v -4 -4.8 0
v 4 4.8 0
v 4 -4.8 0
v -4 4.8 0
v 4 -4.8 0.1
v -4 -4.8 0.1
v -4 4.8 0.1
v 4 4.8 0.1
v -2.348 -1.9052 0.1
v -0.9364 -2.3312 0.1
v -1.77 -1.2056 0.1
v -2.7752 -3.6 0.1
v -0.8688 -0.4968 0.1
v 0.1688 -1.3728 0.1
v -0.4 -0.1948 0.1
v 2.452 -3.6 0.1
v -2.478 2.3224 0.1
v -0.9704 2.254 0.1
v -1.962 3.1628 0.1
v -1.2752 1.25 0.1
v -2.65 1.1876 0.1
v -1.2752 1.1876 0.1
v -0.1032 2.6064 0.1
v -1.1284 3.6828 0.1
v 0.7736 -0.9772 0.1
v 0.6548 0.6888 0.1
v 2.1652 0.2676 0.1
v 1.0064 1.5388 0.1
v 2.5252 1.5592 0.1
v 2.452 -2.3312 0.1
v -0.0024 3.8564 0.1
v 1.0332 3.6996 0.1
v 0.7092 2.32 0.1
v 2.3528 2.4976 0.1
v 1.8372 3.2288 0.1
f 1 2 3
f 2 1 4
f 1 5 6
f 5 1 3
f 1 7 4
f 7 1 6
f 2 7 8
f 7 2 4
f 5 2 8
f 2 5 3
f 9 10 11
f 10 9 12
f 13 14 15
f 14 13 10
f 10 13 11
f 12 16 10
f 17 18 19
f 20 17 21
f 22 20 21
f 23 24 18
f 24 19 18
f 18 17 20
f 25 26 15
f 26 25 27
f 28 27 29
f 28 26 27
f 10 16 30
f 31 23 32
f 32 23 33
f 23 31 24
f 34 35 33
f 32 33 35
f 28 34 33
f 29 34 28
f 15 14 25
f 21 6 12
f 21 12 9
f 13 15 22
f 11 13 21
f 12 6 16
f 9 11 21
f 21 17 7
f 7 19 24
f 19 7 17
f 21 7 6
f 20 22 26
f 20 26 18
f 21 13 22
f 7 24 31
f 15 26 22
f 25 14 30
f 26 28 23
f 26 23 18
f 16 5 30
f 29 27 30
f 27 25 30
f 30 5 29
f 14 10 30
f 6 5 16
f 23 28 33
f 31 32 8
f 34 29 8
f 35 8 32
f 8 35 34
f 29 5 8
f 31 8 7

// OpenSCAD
// file: ../p/4-4edge.scad
use <../lib.scad>
$fa=1; $fs=0.2;
function ldraw_lib__4_4edge(realsolid=false) = [
// 0 Circle 1.0
// 0 Name: 4-4edge.dat
// 0 Author: James Jessiman
// 0 !LDRAW_ORG Primitive UPDATE 2017-01
// 0 !LICENSE Licensed under CC BY 2.0 and CC BY 4.0 : see CAreadme.txt
// 
// 0 BFC CERTIFY CCW
  [0,"BFC","CERTIFY"],
  [0,"BFC","CCW"],
// 
// 0 !HISTORY 1998-12-15 [PTadmin] Official Update 1998-10
// 0 !HISTORY 2005-12-28 [PTadmin] Official Update 2005-01
// 0 !HISTORY 2007-06-24 [PTadmin] Header formatted for Contributor Agreement
// 0 !HISTORY 2008-07-01 [PTadmin] Official Update 2008-01
// 0 !HISTORY 2017-01-15 [Steffen] BFCed
// 0 !HISTORY 2017-12-30 [PTadmin] Official Update 2017-01
// 
// 
// 2 24 1 0 0 0.9239 0 0.3827
  [2,24,1,0,0,0.9239,0,0.3827],
// 2 24 0.9239 0 0.3827 0.7071 0 0.7071
  [2,24,0.9239,0,0.3827,0.7071,0,0.7071],
// 2 24 0.7071 0 0.7071 0.3827 0 0.9239
  [2,24,0.7071,0,0.7071,0.3827,0,0.9239],
// 2 24 0.3827 0 0.9239 0 0 1
  [2,24,0.3827,0,0.9239,0,0,1],
// 2 24 0 0 1 -0.3827 0 0.9239
  [2,24,0,0,1,-0.3827,0,0.9239],
// 2 24 -0.3827 0 0.9239 -0.7071 0 0.7071
  [2,24,-0.3827,0,0.9239,-0.7071,0,0.7071],
// 2 24 -0.7071 0 0.7071 -0.9239 0 0.3827
  [2,24,-0.7071,0,0.7071,-0.9239,0,0.3827],
// 2 24 -0.9239 0 0.3827 -1 0 -0
  [2,24,-0.9239,0,0.3827,-1,0,-0],
// 2 24 -1 0 -0 -0.9239 0 -0.3827
  [2,24,-1,0,-0,-0.9239,0,-0.3827],
// 2 24 -0.9239 0 -0.3827 -0.7071 0 -0.7071
  [2,24,-0.9239,0,-0.3827,-0.7071,0,-0.7071],
// 2 24 -0.7071 0 -0.7071 -0.3827 0 -0.9239
  [2,24,-0.7071,0,-0.7071,-0.3827,0,-0.9239],
// 2 24 -0.3827 0 -0.9239 0 0 -1
  [2,24,-0.3827,0,-0.9239,0,0,-1],
// 2 24 0 0 -1 0.3827 0 -0.9239
  [2,24,0,0,-1,0.3827,0,-0.9239],
// 2 24 0.3827 0 -0.9239 0.7071 0 -0.7071
  [2,24,0.3827,0,-0.9239,0.7071,0,-0.7071],
// 2 24 0.7071 0 -0.7071 0.9239 0 -0.3827
  [2,24,0.7071,0,-0.7071,0.9239,0,-0.3827],
// 2 24 0.9239 0 -0.3827 1 0 0
  [2,24,0.9239,0,-0.3827,1,0,0],
];
module ldraw_lib__4_4edge(step=0, col=false, unit=2/5, alt=false, line=0.2, solid=!$preview)
    makepoly(ldraw_lib__4_4edge(solid), step=step, col=col, unit=unit, alt=alt, line=line, solid=solid);
ldraw_lib__4_4edge(line=0.2);
// file: ../p/4-4disc.scad
use <../lib.scad>
$fa=1; $fs=0.2;
function ldraw_lib__4_4disc(realsolid=false) = [
// 0 Disc 1.0
// 0 Name: 4-4disc.dat
// 0 Author: James Jessiman
// 0 !LDRAW_ORG Primitive UPDATE 2002-02
// 0 !LICENSE Licensed under CC BY 2.0 and CC BY 4.0 : see CAreadme.txt
// 
// 0 BFC CERTIFY CCW
  [0,"BFC","CERTIFY"],
  [0,"BFC","CCW"],
// 
// 0 !HISTORY 1998-12-15 [PTadmin] Official Update 1998-10
// 0 !HISTORY 2002-03-23 [sbliss] Added BFC statement
// 0 !HISTORY 2002-04-25 [PTadmin] Official Update 2002-02
// 0 !HISTORY 2007-06-24 [PTadmin] Header formatted for Contributor Agreement
// 0 !HISTORY 2008-07-01 [PTadmin] Official Update 2008-01
// 
// 
// 3 16 0 0 0 1 0 0 0.9239 0 0.3827
  [3,16,0,0,0,1,0,0,0.9239,0,0.3827],
// 3 16 0 0 0 0.9239 0 0.3827 0.7071 0 0.7071
  [3,16,0,0,0,0.9239,0,0.3827,0.7071,0,0.7071],
// 3 16 0 0 0 0.7071 0 0.7071 0.3827 0 0.9239
  [3,16,0,0,0,0.7071,0,0.7071,0.3827,0,0.9239],
// 3 16 0 0 0 0.3827 0 0.9239 0 0 1
  [3,16,0,0,0,0.3827,0,0.9239,0,0,1],
// 3 16 0 0 0 0 0 1 -0.3827 0 0.9239
  [3,16,0,0,0,0,0,1,-0.3827,0,0.9239],
// 3 16 0 0 0 -0.3827 0 0.9239 -0.7071 0 0.7071
  [3,16,0,0,0,-0.3827,0,0.9239,-0.7071,0,0.7071],
// 3 16 0 0 0 -0.7071 0 0.7071 -0.9239 0 0.3827
  [3,16,0,0,0,-0.7071,0,0.7071,-0.9239,0,0.3827],
// 3 16 0 0 0 -0.9239 0 0.3827 -1 0 -0
  [3,16,0,0,0,-0.9239,0,0.3827,-1,0,-0],
// 3 16 0 0 0 -1 0 -0 -0.9239 0 -0.3827
  [3,16,0,0,0,-1,0,-0,-0.9239,0,-0.3827],
// 3 16 0 0 0 -0.9239 0 -0.3827 -0.7071 0 -0.7071
  [3,16,0,0,0,-0.9239,0,-0.3827,-0.7071,0,-0.7071],
// 3 16 0 0 0 -0.7071 0 -0.7071 -0.3827 0 -0.9239
  [3,16,0,0,0,-0.7071,0,-0.7071,-0.3827,0,-0.9239],
// 3 16 0 0 0 -0.3827 0 -0.9239 0 0 -1
  [3,16,0,0,0,-0.3827,0,-0.9239,0,0,-1],
// 3 16 0 0 0 0 0 -1 0.3827 0 -0.9239
  [3,16,0,0,0,0,0,-1,0.3827,0,-0.9239],
// 3 16 0 0 0 0.3827 0 -0.9239 0.7071 0 -0.7071
  [3,16,0,0,0,0.3827,0,-0.9239,0.7071,0,-0.7071],
// 3 16 0 0 0 0.7071 0 -0.7071 0.9239 0 -0.3827
  [3,16,0,0,0,0.7071,0,-0.7071,0.9239,0,-0.3827],
// 3 16 0 0 0 0.9239 0 -0.3827 1 0 0
  [3,16,0,0,0,0.9239,0,-0.3827,1,0,0],
// 0
];
module ldraw_lib__4_4disc(step=0, col=false, unit=2/5, alt=false, line=0.2, solid=!$preview)
    makepoly(ldraw_lib__4_4disc(solid), step=step, col=col, unit=unit, alt=alt, line=line, solid=solid);
ldraw_lib__4_4disc(line=0.2);
// file: ../p/4-4cyli.scad
use <../lib.scad>
$fa=1; $fs=0.2;
function ldraw_lib__4_4cyli(realsolid=false) = [
// 0 Cylinder 1.0
// 0 Name: 4-4cyli.dat
// 0 Author: James Jessiman
// 0 !LDRAW_ORG Primitive UPDATE 2005-01
// 0 !LICENSE Licensed under CC BY 2.0 and CC BY 4.0 : see CAreadme.txt
// 
// 0 BFC CERTIFY CCW
  [0,"BFC","CERTIFY"],
  [0,"BFC","CCW"],
// 
// 0 !HISTORY 1998-12-15 [PTadmin] Official Update 1998-10
// 0 !HISTORY 2002-03-23 [sbliss] Added BFC statement; merged headers from files in distributions LDraw 0.27 and Complete.
// 0 !HISTORY 2002-04-25 [PTadmin] Official Update 2002-02
// 0 !HISTORY 2004-12-14 [guyvivan] BFC CCW
// 0 !HISTORY 2005-12-28 [PTadmin] Official Update 2005-01
// 0 !HISTORY 2007-06-24 [PTadmin] Header formatted for Contributor Agreement
// 0 !HISTORY 2008-07-01 [PTadmin] Official Update 2008-01
// 
// 
// 4 16 1 1 0 0.9239 1 0.3827 0.9239 0 0.3827 1 0 0
  [4,16,1,1,0,0.9239,1,0.3827,0.9239,0,0.3827,1,0,0],
// 5 24 1 0 0 1 1 0 0.9239 0 0.3827 0.9239 0 -0.3827
  [5,24,1,0,0,1,1,0,0.9239,0,0.3827,0.9239,0,-0.3827],
// 4 16 0.9239 1 0.3827 0.7071 1 0.7071 0.7071 0 0.7071 0.9239 0 0.3827
  [4,16,0.9239,1,0.3827,0.7071,1,0.7071,0.7071,0,0.7071,0.9239,0,0.3827],
// 5 24 0.9239 0 0.3827 0.9239 1 0.3827 0.7071 0 0.7071 1 0 0
  [5,24,0.9239,0,0.3827,0.9239,1,0.3827,0.7071,0,0.7071,1,0,0],
// 4 16 0.7071 1 0.7071 0.3827 1 0.9239 0.3827 0 0.9239 0.7071 0 0.7071
  [4,16,0.7071,1,0.7071,0.3827,1,0.9239,0.3827,0,0.9239,0.7071,0,0.7071],
// 5 24 0.7071 0 0.7071 0.7071 1 0.7071 0.3827 0 0.9239 0.9239 0 0.3827
  [5,24,0.7071,0,0.7071,0.7071,1,0.7071,0.3827,0,0.9239,0.9239,0,0.3827],
// 4 16 0.3827 1 0.9239 0 1 1 0 0 1 0.3827 0 0.9239
  [4,16,0.3827,1,0.9239,0,1,1,0,0,1,0.3827,0,0.9239],
// 5 24 0.3827 0 0.9239 0.3827 1 0.9239 0 0 1 0.7071 0 0.7071
  [5,24,0.3827,0,0.9239,0.3827,1,0.9239,0,0,1,0.7071,0,0.7071],
// 4 16 0 1 1 -0.3827 1 0.9239 -0.3827 0 0.9239 0 0 1
  [4,16,0,1,1,-0.3827,1,0.9239,-0.3827,0,0.9239,0,0,1],
// 5 24 0 0 1 0 1 1 -0.3827 0 0.9239 0.3827 0 0.9239
  [5,24,0,0,1,0,1,1,-0.3827,0,0.9239,0.3827,0,0.9239],
// 4 16 -0.3827 1 0.9239 -0.7071 1 0.7071 -0.7071 0 0.7071 -0.3827 0 0.9239
  [4,16,-0.3827,1,0.9239,-0.7071,1,0.7071,-0.7071,0,0.7071,-0.3827,0,0.9239],
// 5 24 -0.3827 0 0.9239 -0.3827 1 0.9239 -0.7071 0 0.7071 0 0 1
  [5,24,-0.3827,0,0.9239,-0.3827,1,0.9239,-0.7071,0,0.7071,0,0,1],
// 4 16 -0.7071 1 0.7071 -0.9239 1 0.3827 -0.9239 0 0.3827 -0.7071 0 0.7071
  [4,16,-0.7071,1,0.7071,-0.9239,1,0.3827,-0.9239,0,0.3827,-0.7071,0,0.7071],
// 5 24 -0.7071 0 0.7071 -0.7071 1 0.7071 -0.9239 0 0.3827 -0.3827 0 0.9239
  [5,24,-0.7071,0,0.7071,-0.7071,1,0.7071,-0.9239,0,0.3827,-0.3827,0,0.9239],
// 4 16 -0.9239 1 0.3827 -1 1 0 -1 0 0 -0.9239 0 0.3827
  [4,16,-0.9239,1,0.3827,-1,1,0,-1,0,0,-0.9239,0,0.3827],
// 5 24 -0.9239 0 0.3827 -0.9239 1 0.3827 -1 0 0 -0.7071 0 0.7071
  [5,24,-0.9239,0,0.3827,-0.9239,1,0.3827,-1,0,0,-0.7071,0,0.7071],
// 4 16 -1 1 0 -0.9239 1 -0.3827 -0.9239 0 -0.3827 -1 0 0
  [4,16,-1,1,0,-0.9239,1,-0.3827,-0.9239,0,-0.3827,-1,0,0],
// 5 24 -1 0 0 -1 1 0 -0.9239 0 -0.3827 -0.9239 0 0.3827
  [5,24,-1,0,0,-1,1,0,-0.9239,0,-0.3827,-0.9239,0,0.3827],
// 4 16 -0.9239 1 -0.3827 -0.7071 1 -0.7071 -0.7071 0 -0.7071 -0.9239 0 -0.3827
  [4,16,-0.9239,1,-0.3827,-0.7071,1,-0.7071,-0.7071,0,-0.7071,-0.9239,0,-0.3827],
// 5 24 -0.9239 0 -0.3827 -0.9239 1 -0.3827 -0.7071 0 -0.7071 -1 0 0
  [5,24,-0.9239,0,-0.3827,-0.9239,1,-0.3827,-0.7071,0,-0.7071,-1,0,0],
// 4 16 -0.7071 1 -0.7071 -0.3827 1 -0.9239 -0.3827 0 -0.9239 -0.7071 0 -0.7071
  [4,16,-0.7071,1,-0.7071,-0.3827,1,-0.9239,-0.3827,0,-0.9239,-0.7071,0,-0.7071],
// 5 24 -0.7071 0 -0.7071 -0.7071 1 -0.7071 -0.3827 0 -0.9239 -0.9239 0 -0.3827
  [5,24,-0.7071,0,-0.7071,-0.7071,1,-0.7071,-0.3827,0,-0.9239,-0.9239,0,-0.3827],
// 4 16 -0.3827 1 -0.9239 0 1 -1 0 0 -1 -0.3827 0 -0.9239
  [4,16,-0.3827,1,-0.9239,0,1,-1,0,0,-1,-0.3827,0,-0.9239],
// 5 24 -0.3827 0 -0.9239 -0.3827 1 -0.9239 0 0 -1 -0.7071 0 -0.7071
  [5,24,-0.3827,0,-0.9239,-0.3827,1,-0.9239,0,0,-1,-0.7071,0,-0.7071],
// 4 16 0 1 -1 0.3827 1 -0.9239 0.3827 0 -0.9239 0 0 -1
  [4,16,0,1,-1,0.3827,1,-0.9239,0.3827,0,-0.9239,0,0,-1],
// 5 24 0 0 -1 0 1 -1 0.3827 0 -0.9239 -0.3827 0 -0.9239
  [5,24,0,0,-1,0,1,-1,0.3827,0,-0.9239,-0.3827,0,-0.9239],
// 4 16 0.3827 1 -0.9239 0.7071 1 -0.7071 0.7071 0 -0.7071 0.3827 0 -0.9239
  [4,16,0.3827,1,-0.9239,0.7071,1,-0.7071,0.7071,0,-0.7071,0.3827,0,-0.9239],
// 5 24 0.3827 0 -0.9239 0.3827 1 -0.9239 0.7071 0 -0.7071 0 0 -1
  [5,24,0.3827,0,-0.9239,0.3827,1,-0.9239,0.7071,0,-0.7071,0,0,-1],
// 4 16 0.7071 1 -0.7071 0.9239 1 -0.3827 0.9239 0 -0.3827 0.7071 0 -0.7071
  [4,16,0.7071,1,-0.7071,0.9239,1,-0.3827,0.9239,0,-0.3827,0.7071,0,-0.7071],
// 5 24 0.7071 0 -0.7071 0.7071 1 -0.7071 0.9239 0 -0.3827 0.3827 0 -0.9239
  [5,24,0.7071,0,-0.7071,0.7071,1,-0.7071,0.9239,0,-0.3827,0.3827,0,-0.9239],
// 4 16 0.9239 1 -0.3827 1 1 0 1 0 0 0.9239 0 -0.3827
  [4,16,0.9239,1,-0.3827,1,1,0,1,0,0,0.9239,0,-0.3827],
// 5 24 0.9239 0 -0.3827 0.9239 1 -0.3827 1 0 0 0.7071 0 -0.7071
  [5,24,0.9239,0,-0.3827,0.9239,1,-0.3827,1,0,0,0.7071,0,-0.7071],
// 0
];
module ldraw_lib__4_4cyli(step=0, col=false, unit=2/5, alt=false, line=0.2, solid=!$preview)
    makepoly(ldraw_lib__4_4cyli(solid), step=step, col=col, unit=unit, alt=alt, line=line, solid=solid);
ldraw_lib__4_4cyli(line=0.2);
// file: ../p/stud3.scad
use <../lib.scad>
use <4-4cyli.scad>
use <4-4disc.scad>
use <4-4edge.scad>
$fa=1; $fs=0.2;
function ldraw_lib__stud3(realsolid=false) = realsolid ? 
    [openscad(translate([0,0,-eps()], o=cylinder(4+eps(), r=4)),2)] : [
// 0 Stud Tube Solid
// 0 Name: stud3.dat
// 0 Author: James Jessiman
// 0 !LDRAW_ORG Primitive UPDATE 2012-01
// 0 !LICENSE Licensed under CC BY 2.0 and CC BY 4.0 : see CAreadme.txt
// 
// 0 BFC CERTIFY CCW
  [0,"BFC","CERTIFY"],
  [0,"BFC","CCW"],
// 
// 0 !HISTORY 2002-04-04 [sbliss] Modified for BFC compliance
// 0 !HISTORY 2002-04-25 [PTadmin] Official Update 2002-02
// 0 !HISTORY 2007-06-24 [PTadmin] Header formatted for Contributor Agreement
// 0 !HISTORY 2008-07-01 [PTadmin] Official Update 2008-01
// 0 !HISTORY 2012-02-16 [Philo] Changed to CCW
// 0 !HISTORY 2012-03-30 [PTadmin] Official Update 2012-01
// 
// 
// 1 16 0 -4 0 4 0 0 0 1 0 0 0 4 4-4edge.dat
  [1,16,0,-4,0,4,0,0,0,1,0,0,0,4, ldraw_lib__4_4edge(realsolid)],
// 1 16 0 0 0 4 0 0 0 1 0 0 0 4 4-4edge.dat
  [1,16,0,0,0,4,0,0,0,1,0,0,0,4, ldraw_lib__4_4edge(realsolid)],
// 1 16 0 -4 0 4 0 0 0 1 0 0 0 4 4-4disc.dat
  [1,16,0,-4,0,4,0,0,0,1,0,0,0,4, ldraw_lib__4_4disc(realsolid)],
// 1 16 0 -4 0 4 0 0 0 4 0 0 0 4 4-4cyli.dat
  [1,16,0,-4,0,4,0,0,0,4,0,0,0,4, ldraw_lib__4_4cyli(realsolid)],
];
module ldraw_lib__stud3(step=0, col=false, unit=2/5, alt=false, line=0.2, solid=!$preview)
    makepoly(ldraw_lib__stud3(solid), step=step, col=col, unit=unit, alt=alt, line=line, solid=solid);
ldraw_lib__stud3(line=0.2);
// file: ../p/stud.scad
use <../lib.scad>
use <4-4cyli.scad>
use <4-4disc.scad>
use <4-4edge.scad>
$fa=1; $fs=0.2;
function ldraw_lib__stud(realsolid=false) = realsolid ? 
    [openscad(translate([0,0,-eps()], o=cylinder(4+eps(), r=6)),2)] : [
// 0 Stud
// 0 Name: stud.dat
// 0 Author: James Jessiman
// 0 !LDRAW_ORG Primitive UPDATE 2012-01
// 0 !LICENSE Licensed under CC BY 2.0 and CC BY 4.0 : see CAreadme.txt
// 
// 0 BFC CERTIFY CCW
  [0,"BFC","CERTIFY"],
  [0,"BFC","CCW"],
// 
// 0 !HISTORY 2002-04-04 [sbliss] Modified for BFC compliance
// 0 !HISTORY 2002-04-25 [PTadmin] Official Update 2002-02
// 0 !HISTORY 2007-06-24 [PTadmin] Header formatted for Contributor Agreement
// 0 !HISTORY 2008-07-01 [PTadmin] Official Update 2008-01
// 0 !HISTORY 2012-02-16 [Philo] Changed to CCW
// 0 !HISTORY 2012-03-30 [PTadmin] Official Update 2012-01
// 
// 
// 1 16 0 0 0 6 0 0 0 1 0 0 0 6 4-4edge.dat
  [1,16,0,0,0,6,0,0,0,1,0,0,0,6, ldraw_lib__4_4edge(realsolid)],
// 1 16 0 -4 0 6 0 0 0 1 0 0 0 6 4-4edge.dat
  [1,16,0,-4,0,6,0,0,0,1,0,0,0,6, ldraw_lib__4_4edge(realsolid)],
// 1 16 0 0 0 6 0 0 0 -4 0 0 0 6 4-4cyli.dat
  [1,16,0,0,0,6,0,0,0,-4,0,0,0,6, ldraw_lib__4_4cyli(realsolid)],
// 1 16 0 -4 0 6 0 0 0 1 0 0 0 6 4-4disc.dat
  [1,16,0,-4,0,6,0,0,0,1,0,0,0,6, ldraw_lib__4_4disc(realsolid)],
];
module ldraw_lib__stud(step=0, col=false, unit=2/5, alt=false, line=0.2, solid=!$preview)
    makepoly(ldraw_lib__stud(solid), step=step, col=col, unit=unit, alt=alt, line=line, solid=solid);
ldraw_lib__stud(line=0.2);
// file: ../p/box5.scad
use <../lib.scad>
$fa=1; $fs=0.2;
function ldraw_lib__box5(realsolid=false) = [
// 0 Box with 5 Faces and All Edges
// 0 Name: box5.dat
// 0 Author: James Jessiman
// 0 !LDRAW_ORG Primitive UPDATE 2012-01
// 0 !LICENSE Licensed under CC BY 2.0 and CC BY 4.0 : see CAreadme.txt
// 
// 0 BFC CERTIFY CCW
  [0,"BFC","CERTIFY"],
  [0,"BFC","CCW"],
// 
// 0 !HISTORY 2002-04-03 [sbliss] Modified for BFC compliance
// 0 !HISTORY 2002-04-25 [PTadmin] Official Update 2002-02
// 0 !HISTORY 2007-06-24 [PTadmin] Header formatted for Contributor Agreement
// 0 !HISTORY 2008-07-01 [PTadmin] Official Update 2008-01
// 0 !HISTORY 2012-02-16 [Philo] Changed to CCW
// 0 !HISTORY 2012-03-30 [PTadmin] Official Update 2012-01
// 
// 
// 2 24 1 1 1 -1 1 1
  [2,24,1,1,1,-1,1,1],
// 2 24 -1 1 1 -1 1 -1
  [2,24,-1,1,1,-1,1,-1],
// 2 24 -1 1 -1 1 1 -1
  [2,24,-1,1,-1,1,1,-1],
// 2 24 1 1 -1 1 1 1
  [2,24,1,1,-1,1,1,1],
// 2 24 1 0 1 -1 0 1
  [2,24,1,0,1,-1,0,1],
// 2 24 -1 0 1 -1 0 -1
  [2,24,-1,0,1,-1,0,-1],
// 2 24 -1 0 -1 1 0 -1
  [2,24,-1,0,-1,1,0,-1],
// 2 24 1 0 -1 1 0 1
  [2,24,1,0,-1,1,0,1],
// 2 24 1 0 1 1 1 1
  [2,24,1,0,1,1,1,1],
// 2 24 -1 0 1 -1 1 1
  [2,24,-1,0,1,-1,1,1],
// 2 24 1 0 -1 1 1 -1
  [2,24,1,0,-1,1,1,-1],
// 2 24 -1 0 -1 -1 1 -1
  [2,24,-1,0,-1,-1,1,-1],
// 4 16 -1 1 1 1 1 1 1 1 -1 -1 1 -1
  [4,16,-1,1,1,1,1,1,1,1,-1,-1,1,-1],
// 4 16 -1 1 1 -1 0 1 1 0 1 1 1 1
  [4,16,-1,1,1,-1,0,1,1,0,1,1,1,1],
// 4 16 -1 1 -1 -1 0 -1 -1 0 1 -1 1 1
  [4,16,-1,1,-1,-1,0,-1,-1,0,1,-1,1,1],
// 4 16 1 1 -1 1 0 -1 -1 0 -1 -1 1 -1
  [4,16,1,1,-1,1,0,-1,-1,0,-1,-1,1,-1],
// 4 16 1 1 1 1 0 1 1 0 -1 1 1 -1
  [4,16,1,1,1,1,0,1,1,0,-1,1,1,-1],
];
module ldraw_lib__box5(step=0, col=false, unit=2/5, alt=false, line=0.2, solid=!$preview)
    makepoly(ldraw_lib__box5(solid), step=step, col=col, unit=unit, alt=alt, line=line, solid=solid);
ldraw_lib__box5(line=0.2);
// file: ../p/box4t.scad
use <../lib.scad>
$fa=1; $fs=0.2;
function ldraw_lib__box4t(realsolid=false) = [
// 0 Box with 4 Adjacent Faces and All Edges
// 0 Name: box4t.dat
// 0 Author: Tore Eriksson [Tore_Eriksson]
// 0 !LDRAW_ORG Primitive UPDATE 2003-02
// 0 !LICENSE Licensed under CC BY 2.0 and CC BY 4.0 : see CAreadme.txt
// 
// 0 BFC CERTIFY CCW
  [0,"BFC","CERTIFY"],
  [0,"BFC","CCW"],
// 
// 0 !HISTORY 1997-09-29 [PTadmin] Official Update 1997-15
// 0 !HISTORY 2002-08-31 [izanette] Modified with WINDZ for BFC compliance
// 0 !HISTORY 2003-08-01 [PTadmin] Official Update 2003-02
// 0 !HISTORY 2007-06-24 [PTadmin] Header formatted for Contributor Agreement
// 0 !HISTORY 2008-07-01 [PTadmin] Official Update 2008-01
// 
// 
// 2 24 1 1 1 -1 1 1
  [2,24,1,1,1,-1,1,1],
// 2 24 -1 1 1 -1 1 -1
  [2,24,-1,1,1,-1,1,-1],
// 2 24 -1 1 -1 1 1 -1
  [2,24,-1,1,-1,1,1,-1],
// 2 24 1 1 -1 1 1 1
  [2,24,1,1,-1,1,1,1],
// 2 24 1 0 1 -1 0 1
  [2,24,1,0,1,-1,0,1],
// 2 24 -1 0 1 -1 0 -1
  [2,24,-1,0,1,-1,0,-1],
// 2 24 -1 0 -1 1 0 -1
  [2,24,-1,0,-1,1,0,-1],
// 2 24 1 0 -1 1 0 1
  [2,24,1,0,-1,1,0,1],
// 2 24 1 0 1 1 1 1
  [2,24,1,0,1,1,1,1],
// 2 24 -1 0 1 -1 1 1
  [2,24,-1,0,1,-1,1,1],
// 2 24 1 0 -1 1 1 -1
  [2,24,1,0,-1,1,1,-1],
// 2 24 -1 0 -1 -1 1 -1
  [2,24,-1,0,-1,-1,1,-1],
// 4 16 1 1 1 1 1 -1 -1 1 -1 -1 1 1
  [4,16,1,1,1,1,1,-1,-1,1,-1,-1,1,1],
// 4 16 1 1 1 -1 1 1 -1 0 1 1 0 1
  [4,16,1,1,1,-1,1,1,-1,0,1,1,0,1],
// 4 16 -1 1 1 -1 1 -1 -1 0 -1 -1 0 1
  [4,16,-1,1,1,-1,1,-1,-1,0,-1,-1,0,1],
// 0 4 16 -1 1 -1 -1 0 -1 1 0 -1 1 1 -1
// 4 16 1 1 -1 1 1 1 1 0 1 1 0 -1
  [4,16,1,1,-1,1,1,1,1,0,1,1,0,-1],
// 0
];
module ldraw_lib__box4t(step=0, col=false, unit=2/5, alt=false, line=0.2, solid=!$preview)
    makepoly(ldraw_lib__box4t(solid), step=step, col=col, unit=unit, alt=alt, line=line, solid=solid);
ldraw_lib__box4t(line=0.2);
// file: s/3004s01.scad
use <../../lib.scad>
use <../../p/box4t.scad>
use <../../p/box5.scad>
use <../../p/stud.scad>
use <../../p/stud3.scad>
$fa=1; $fs=0.2;
function ldraw_lib__s__3004s01(realsolid=false) = [
// 0 ~Brick  1 x  2 without Front Face
// 0 Name: s\3004s01.dat
// 0 Author: James Jessiman
// 0 !LDRAW_ORG Subpart UPDATE 2003-03
// 0 !LICENSE Licensed under CC BY 2.0 and CC BY 4.0 : see CAreadme.txt
// 
// 0 BFC CERTIFY CCW
  [0,"BFC","CERTIFY"],
  [0,"BFC","CCW"],
// 
// 0 !HISTORY 2003-09-07 [jriley] Subfiling, BFC
// 0 !HISTORY 2003-12-19 [PTadmin] Official Update 2003-03
// 0 !HISTORY 2007-08-29 [PTadmin] Header formatted for Contributor Agreement
// 0 !HISTORY 2008-07-01 [PTadmin] Official Update 2008-01
// 
// 
// 1 16 0 4 0 1 0 0 0 -5 0 0 0 1 stud3.dat
  [1,16,0,4,0,1,0,0,0,-5,0,0,0,1, ldraw_lib__stud3(realsolid)],
// 0 BFC INVERTNEXT
  [0,"BFC","INVERTNEXT"],
// 1 16 0 24 0 16 0 0 0 -20 0 0 0 6 box5.dat
  [1,16,0,24,0,16,0,0,0,-20,0,0,0,6, ldraw_lib__box5(realsolid)],
// 4 16 20 24 10 16 24 6 -16 24 6 -20 24 10
  [4,16,20,24,10,16,24,6,-16,24,6,-20,24,10],
// 4 16 -20 24 10 -16 24 6 -16 24 -6 -20 24 -10
  [4,16,-20,24,10,-16,24,6,-16,24,-6,-20,24,-10],
// 4 16 -20 24 -10 -16 24 -6 16 24 -6 20 24 -10
  [4,16,-20,24,-10,-16,24,-6,16,24,-6,20,24,-10],
// 4 16 20 24 -10 16 24 -6 16 24 6 20 24 10
  [4,16,20,24,-10,16,24,-6,16,24,6,20,24,10],
// 1 16 0 24 0 20 0 0 0 -24 0 0 0 10 box4t.dat
  [1,16,0,24,0,20,0,0,0,-24,0,0,0,10, ldraw_lib__box4t(realsolid)],
// 1 16 10 0 0 1 0 0 0 1 0 0 0 1 stud.dat
  [1,16,10,0,0,1,0,0,0,1,0,0,0,1, ldraw_lib__stud(realsolid)],
// 1 16 -10 0 0 1 0 0 0 1 0 0 0 1 stud.dat
  [1,16,-10,0,0,1,0,0,0,1,0,0,0,1, ldraw_lib__stud(realsolid)],
// 0
];
module ldraw_lib__s__3004s01(step=0, col=false, unit=2/5, alt=false, line=0.2, solid=!$preview)
    makepoly(ldraw_lib__s__3004s01(solid), step=step, col=col, unit=unit, alt=alt, line=line, solid=solid);
ldraw_lib__s__3004s01(line=0.2);
// file: 3004.scad
use <../lib.scad>
use <s/3004s01.scad>
$fa=1; $fs=0.2;
function ldraw_lib__3004(realsolid=false) = [
// 0 Brick  1 x  2
// 0 Name: 3004.dat
// 0 Author: James Jessiman
// 0 !LDRAW_ORG Part UPDATE 2022-05
// 0 !LICENSE Licensed under CC BY 2.0 and CC BY 4.0 : see CAreadme.txt
// 
// 0 BFC CERTIFY CCW
  [0,"BFC","CERTIFY"],
  [0,"BFC","CCW"],
// 
// 0 !HISTORY 2001-10-26 [PTadmin] Official Update 2001-01
// 0 !HISTORY 2002-05-07 {unknown} BFC Certification
// 0 !HISTORY 2002-06-11 [PTadmin] Official Update 2002-03
// 0 !HISTORY 2007-05-07 [PTadmin] Header formatted for Contributor Agreement
// 0 !HISTORY 2008-07-01 [PTadmin] Official Update 2008-01
// 0 !HISTORY 2022-08-04 [MagFors] Using subfile
// 0 !HISTORY 2022-09-15 [PTadmin] Official Update 2022-05
// 
// 
// 1 16 0 0 0 1 0 0 0 1 0 0 0 1 s\3004s01.dat
  [1,16,0,0,0,1,0,0,0,1,0,0,0,1, ldraw_lib__s__3004s01(realsolid)],
// 4 16 -20 24 -10 20 24 -10 20 0 -10 -20 0 -10
  [4,16,-20,24,-10,20,24,-10,20,0,-10,-20,0,-10],
];
module ldraw_lib__3004(step=0, col=false, unit=2/5, alt=false, line=0.2, solid=!$preview)
    makepoly(ldraw_lib__3004(solid), step=step, col=col, unit=unit, alt=alt, line=line, solid=solid);
ldraw_lib__3004(line=0.2);
// file: ../p/box5-12.scad
use <../lib.scad>
$fa=1; $fs=0.2;
function ldraw_lib__box5_12(realsolid=false) = [
// 0 Box with 5 Faces without Any Edges
// 0 Name: box5-12.dat
// 0 Author: Chris Dee [cwdee]
// 0 !LDRAW_ORG Primitive UPDATE 2009-02
// 0 !LICENSE Licensed under CC BY 2.0 and CC BY 4.0 : see CAreadme.txt
// 
// 0 BFC CERTIFY CCW
  [0,"BFC","CERTIFY"],
  [0,"BFC","CCW"],
// 
// 0 !HISTORY 2009-09-03 [PTadmin] Official Update 2009-02
// 
// 
// 4 16 1 1 1 1 1 -1 -1 1 -1 -1 1 1
  [4,16,1,1,1,1,1,-1,-1,1,-1,-1,1,1],
// 4 16 -1 0 1 1 0 1 1 1 1 -1 1 1
  [4,16,-1,0,1,1,0,1,1,1,1,-1,1,1],
// 4 16 -1 0 -1 -1 0 1 -1 1 1 -1 1 -1
  [4,16,-1,0,-1,-1,0,1,-1,1,1,-1,1,-1],
// 4 16 1 0 -1 -1 0 -1 -1 1 -1 1 1 -1
  [4,16,1,0,-1,-1,0,-1,-1,1,-1,1,1,-1],
// 4 16 1 0 1 1 0 -1 1 1 -1 1 1 1
  [4,16,1,0,1,1,0,-1,1,1,-1,1,1,1],
// 0
];
module ldraw_lib__box5_12(step=0, col=false, unit=2/5, alt=false, line=0.2, solid=!$preview)
    makepoly(ldraw_lib__box5_12(solid), step=step, col=col, unit=unit, alt=alt, line=line, solid=solid);
ldraw_lib__box5_12(line=0.2);
// main file
use <../lib.scad>
use <../p/box5-12.scad>
$fa=1; $fs=0.2;
function ldraw_lib__191888d(realsolid=false) = [
// 0 Sticker  1.2 x  1 with White "2"
// 0 Name: 191888d.dat
// 0 Author: Steffen [Steffen]
// 0 !LDRAW_ORG Part UPDATE 2012-01
// 0 !LICENSE Licensed under CC BY 2.0 and CC BY 4.0 : see CAreadme.txt
// 
// 0 BFC CERTIFY CCW
  [0,"BFC","CERTIFY"],
  [0,"BFC","CCW"],
// 
// 0 !KEYWORDS set 7710
// 
// 0 !HISTORY 2012-03-30 [PTadmin] Official Update 2012-01
// 
// 
// 1 16 0 -0.25 0 10 0 0 0 0.25 0 0 0 -12 box5-12.dat
  [1,16,0,-0.25,0,10,0,0,0,0.25,0,0,0,-12, ldraw_lib__box5_12(realsolid)],
// 3 15 -5.87 -0.25 -4.763 -2.341 -0.25 -5.828 -4.425 -0.25 -3.014
  [3,15,-5.87,-0.25,-4.763,-2.341,-0.25,-5.828,-4.425,-0.25,-3.014],
// 3 15 -2.341 -0.25 -5.828 -5.87 -0.25 -4.763 -6.938 -0.25 -9
  [3,15,-2.341,-0.25,-5.828,-5.87,-0.25,-4.763,-6.938,-0.25,-9],
// 3 15 -2.172 -0.25 -1.242 0.422 -0.25 -3.432 -1 -0.25 -0.487
  [3,15,-2.172,-0.25,-1.242,0.422,-0.25,-3.432,-1,-0.25,-0.487],
// 3 15 0.422 -0.25 -3.432 -2.172 -0.25 -1.242 -2.341 -0.25 -5.828
  [3,15,0.422,-0.25,-3.432,-2.172,-0.25,-1.242,-2.341,-0.25,-5.828],
// 3 15 -2.341 -0.25 -5.828 -2.172 -0.25 -1.242 -4.425 -0.25 -3.014
  [3,15,-2.341,-0.25,-5.828,-2.172,-0.25,-1.242,-4.425,-0.25,-3.014],
// 3 15 -6.938 -0.25 -9 6.13 -0.25 -9 -2.341 -0.25 -5.828
  [3,15,-6.938,-0.25,-9,6.13,-0.25,-9,-2.341,-0.25,-5.828],
// 3 15 -6.195 -0.25 5.806 -2.426 -0.25 5.635 -4.905 -0.25 7.907
  [3,15,-6.195,-0.25,5.806,-2.426,-0.25,5.635,-4.905,-0.25,7.907],
// 3 15 -3.188 -0.25 3.125 -6.195 -0.25 5.806 -6.625 -0.25 2.969
  [3,15,-3.188,-0.25,3.125,-6.195,-0.25,5.806,-6.625,-0.25,2.969],
// 3 15 -3.188 -0.25 2.969 -3.188 -0.25 3.125 -6.625 -0.25 2.969
  [3,15,-3.188,-0.25,2.969,-3.188,-0.25,3.125,-6.625,-0.25,2.969],
// 3 15 -0.258 -0.25 6.516 -2.821 -0.25 9.207 -2.426 -0.25 5.635
  [3,15,-0.258,-0.25,6.516,-2.821,-0.25,9.207,-2.426,-0.25,5.635],
// 3 15 -2.821 -0.25 9.207 -4.905 -0.25 7.907 -2.426 -0.25 5.635
  [3,15,-2.821,-0.25,9.207,-4.905,-0.25,7.907,-2.426,-0.25,5.635],
// 3 15 -2.426 -0.25 5.635 -6.195 -0.25 5.806 -3.188 -0.25 3.125
  [3,15,-2.426,-0.25,5.635,-6.195,-0.25,5.806,-3.188,-0.25,3.125],
// 3 15 1.934 -0.25 -2.443 1.637 -0.25 1.722 -1 -0.25 -0.487
  [3,15,1.934,-0.25,-2.443,1.637,-0.25,1.722,-1,-0.25,-0.487],
// 3 15 1.637 -0.25 1.722 1.934 -0.25 -2.443 5.413 -0.25 0.669
  [3,15,1.637,-0.25,1.722,1.934,-0.25,-2.443,5.413,-0.25,0.669],
// 3 15 2.516 -0.25 3.847 5.413 -0.25 0.669 6.313 -0.25 3.898
  [3,15,2.516,-0.25,3.847,5.413,-0.25,0.669,6.313,-0.25,3.898],
// 3 15 2.516 -0.25 3.847 1.637 -0.25 1.722 5.413 -0.25 0.669
  [3,15,2.516,-0.25,3.847,1.637,-0.25,1.722,5.413,-0.25,0.669],
// 3 15 -2.341 -0.25 -5.828 6.13 -0.25 -9 6.13 -0.25 -5.828
  [3,15,-2.341,-0.25,-5.828,6.13,-0.25,-9,6.13,-0.25,-5.828],
// 3 15 -0.006 -0.25 9.641 -0.258 -0.25 6.516 2.583 -0.25 9.249
  [3,15,-0.006,-0.25,9.641,-0.258,-0.25,6.516,2.583,-0.25,9.249],
// 3 15 2.583 -0.25 9.249 -0.258 -0.25 6.516 1.773 -0.25 5.8
  [3,15,2.583,-0.25,9.249,-0.258,-0.25,6.516,1.773,-0.25,5.8],
// 3 15 -0.258 -0.25 6.516 -0.006 -0.25 9.641 -2.821 -0.25 9.207
  [3,15,-0.258,-0.25,6.516,-0.006,-0.25,9.641,-2.821,-0.25,9.207],
// 3 15 5.882 -0.25 6.244 4.593 -0.25 8.072 1.773 -0.25 5.8
  [3,15,5.882,-0.25,6.244,4.593,-0.25,8.072,1.773,-0.25,5.8],
// 3 15 2.583 -0.25 9.249 1.773 -0.25 5.8 4.593 -0.25 8.072
  [3,15,2.583,-0.25,9.249,1.773,-0.25,5.8,4.593,-0.25,8.072],
// 3 15 2.516 -0.25 3.847 5.882 -0.25 6.244 1.773 -0.25 5.8
  [3,15,2.516,-0.25,3.847,5.882,-0.25,6.244,1.773,-0.25,5.8],
// 3 15 6.313 -0.25 3.898 5.882 -0.25 6.244 2.516 -0.25 3.847
  [3,15,6.313,-0.25,3.898,5.882,-0.25,6.244,2.516,-0.25,3.847],
// 3 15 -1 -0.25 -0.487 0.422 -0.25 -3.432 1.934 -0.25 -2.443
  [3,15,-1,-0.25,-0.487,0.422,-0.25,-3.432,1.934,-0.25,-2.443],
// 3 16 -6.625 -0.25 2.969 -10 -0.25 -12 -6.938 -0.25 -9
  [3,16,-6.625,-0.25,2.969,-10,-0.25,-12,-6.938,-0.25,-9],
// 3 16 -6.625 -0.25 2.969 -6.938 -0.25 -9 -5.87 -0.25 -4.763
  [3,16,-6.625,-0.25,2.969,-6.938,-0.25,-9,-5.87,-0.25,-4.763],
// 3 16 -2.172 -0.25 -1.242 -1 -0.25 -0.487 -3.188 -0.25 2.969
  [3,16,-2.172,-0.25,-1.242,-1,-0.25,-0.487,-3.188,-0.25,2.969],
// 3 16 -4.425 -0.25 -3.014 -2.172 -0.25 -1.242 -6.625 -0.25 2.969
  [3,16,-4.425,-0.25,-3.014,-2.172,-0.25,-1.242,-6.625,-0.25,2.969],
// 3 16 -6.938 -0.25 -9 -10 -0.25 -12 6.13 -0.25 -9
  [3,16,-6.938,-0.25,-9,-10,-0.25,-12,6.13,-0.25,-9],
// 3 16 -5.87 -0.25 -4.763 -4.425 -0.25 -3.014 -6.625 -0.25 2.969
  [3,16,-5.87,-0.25,-4.763,-4.425,-0.25,-3.014,-6.625,-0.25,2.969],
// 3 16 -6.625 -0.25 2.969 -6.195 -0.25 5.806 -10 -0.25 12
  [3,16,-6.625,-0.25,2.969,-6.195,-0.25,5.806,-10,-0.25,12],
// 3 16 -10 -0.25 12 -4.905 -0.25 7.907 -2.821 -0.25 9.207
  [3,16,-10,-0.25,12,-4.905,-0.25,7.907,-2.821,-0.25,9.207],
// 3 16 -4.905 -0.25 7.907 -10 -0.25 12 -6.195 -0.25 5.806
  [3,16,-4.905,-0.25,7.907,-10,-0.25,12,-6.195,-0.25,5.806],
// 3 16 -6.625 -0.25 2.969 -10 -0.25 12 -10 -0.25 -12
  [3,16,-6.625,-0.25,2.969,-10,-0.25,12,-10,-0.25,-12],
// 3 16 -3.188 -0.25 3.125 -3.188 -0.25 2.969 1.637 -0.25 1.722
  [3,16,-3.188,-0.25,3.125,-3.188,-0.25,2.969,1.637,-0.25,1.722],
// 3 16 -3.188 -0.25 3.125 1.637 -0.25 1.722 -2.426 -0.25 5.635
  [3,16,-3.188,-0.25,3.125,1.637,-0.25,1.722,-2.426,-0.25,5.635],
// 3 16 -6.625 -0.25 2.969 -2.172 -0.25 -1.242 -3.188 -0.25 2.969
  [3,16,-6.625,-0.25,2.969,-2.172,-0.25,-1.242,-3.188,-0.25,2.969],
// 3 16 -10 -0.25 12 -2.821 -0.25 9.207 -0.006 -0.25 9.641
  [3,16,-10,-0.25,12,-2.821,-0.25,9.207,-0.006,-0.25,9.641],
// 3 16 -1 -0.25 -0.487 1.637 -0.25 1.722 -3.188 -0.25 2.969
  [3,16,-1,-0.25,-0.487,1.637,-0.25,1.722,-3.188,-0.25,2.969],
// 3 16 1.934 -0.25 -2.443 0.422 -0.25 -3.432 6.13 -0.25 -5.828
  [3,16,1.934,-0.25,-2.443,0.422,-0.25,-3.432,6.13,-0.25,-5.828],
// 3 16 1.637 -0.25 1.722 2.516 -0.25 3.847 -0.258 -0.25 6.516
  [3,16,1.637,-0.25,1.722,2.516,-0.25,3.847,-0.258,-0.25,6.516],
// 3 16 1.637 -0.25 1.722 -0.258 -0.25 6.516 -2.426 -0.25 5.635
  [3,16,1.637,-0.25,1.722,-0.258,-0.25,6.516,-2.426,-0.25,5.635],
// 3 16 6.13 -0.25 -9 10 -0.25 -12 6.13 -0.25 -5.828
  [3,16,6.13,-0.25,-9,10,-0.25,-12,6.13,-0.25,-5.828],
// 3 16 6.313 -0.25 3.898 5.413 -0.25 0.669 6.13 -0.25 -5.828
  [3,16,6.313,-0.25,3.898,5.413,-0.25,0.669,6.13,-0.25,-5.828],
// 3 16 5.413 -0.25 0.669 1.934 -0.25 -2.443 6.13 -0.25 -5.828
  [3,16,5.413,-0.25,0.669,1.934,-0.25,-2.443,6.13,-0.25,-5.828],
// 3 16 6.13 -0.25 -5.828 10 -0.25 -12 6.313 -0.25 3.898
  [3,16,6.13,-0.25,-5.828,10,-0.25,-12,6.313,-0.25,3.898],
// 3 16 0.422 -0.25 -3.432 -2.341 -0.25 -5.828 6.13 -0.25 -5.828
  [3,16,0.422,-0.25,-3.432,-2.341,-0.25,-5.828,6.13,-0.25,-5.828],
// 3 16 -10 -0.25 -12 10 -0.25 -12 6.13 -0.25 -9
  [3,16,-10,-0.25,-12,10,-0.25,-12,6.13,-0.25,-9],
// 3 16 -0.258 -0.25 6.516 2.516 -0.25 3.847 1.773 -0.25 5.8
  [3,16,-0.258,-0.25,6.516,2.516,-0.25,3.847,1.773,-0.25,5.8],
// 3 16 -0.006 -0.25 9.641 2.583 -0.25 9.249 10 -0.25 12
  [3,16,-0.006,-0.25,9.641,2.583,-0.25,9.249,10,-0.25,12],
// 3 16 5.882 -0.25 6.244 6.313 -0.25 3.898 10 -0.25 12
  [3,16,5.882,-0.25,6.244,6.313,-0.25,3.898,10,-0.25,12],
// 3 16 4.593 -0.25 8.072 10 -0.25 12 2.583 -0.25 9.249
  [3,16,4.593,-0.25,8.072,10,-0.25,12,2.583,-0.25,9.249],
// 3 16 10 -0.25 12 4.593 -0.25 8.072 5.882 -0.25 6.244
  [3,16,10,-0.25,12,4.593,-0.25,8.072,5.882,-0.25,6.244],
// 3 16 6.313 -0.25 3.898 10 -0.25 -12 10 -0.25 12
  [3,16,6.313,-0.25,3.898,10,-0.25,-12,10,-0.25,12],
// 3 16 -0.006 -0.25 9.641 10 -0.25 12 -10 -0.25 12
  [3,16,-0.006,-0.25,9.641,10,-0.25,12,-10,-0.25,12],
];
module ldraw_lib__191888d(step=0, col=false, unit=2/5, alt=false, line=0.2, solid=!$preview)
    makepoly(ldraw_lib__191888d(solid), step=step, col=col, unit=unit, alt=alt, line=line, solid=solid);
ldraw_lib__191888d(line=0.2);
